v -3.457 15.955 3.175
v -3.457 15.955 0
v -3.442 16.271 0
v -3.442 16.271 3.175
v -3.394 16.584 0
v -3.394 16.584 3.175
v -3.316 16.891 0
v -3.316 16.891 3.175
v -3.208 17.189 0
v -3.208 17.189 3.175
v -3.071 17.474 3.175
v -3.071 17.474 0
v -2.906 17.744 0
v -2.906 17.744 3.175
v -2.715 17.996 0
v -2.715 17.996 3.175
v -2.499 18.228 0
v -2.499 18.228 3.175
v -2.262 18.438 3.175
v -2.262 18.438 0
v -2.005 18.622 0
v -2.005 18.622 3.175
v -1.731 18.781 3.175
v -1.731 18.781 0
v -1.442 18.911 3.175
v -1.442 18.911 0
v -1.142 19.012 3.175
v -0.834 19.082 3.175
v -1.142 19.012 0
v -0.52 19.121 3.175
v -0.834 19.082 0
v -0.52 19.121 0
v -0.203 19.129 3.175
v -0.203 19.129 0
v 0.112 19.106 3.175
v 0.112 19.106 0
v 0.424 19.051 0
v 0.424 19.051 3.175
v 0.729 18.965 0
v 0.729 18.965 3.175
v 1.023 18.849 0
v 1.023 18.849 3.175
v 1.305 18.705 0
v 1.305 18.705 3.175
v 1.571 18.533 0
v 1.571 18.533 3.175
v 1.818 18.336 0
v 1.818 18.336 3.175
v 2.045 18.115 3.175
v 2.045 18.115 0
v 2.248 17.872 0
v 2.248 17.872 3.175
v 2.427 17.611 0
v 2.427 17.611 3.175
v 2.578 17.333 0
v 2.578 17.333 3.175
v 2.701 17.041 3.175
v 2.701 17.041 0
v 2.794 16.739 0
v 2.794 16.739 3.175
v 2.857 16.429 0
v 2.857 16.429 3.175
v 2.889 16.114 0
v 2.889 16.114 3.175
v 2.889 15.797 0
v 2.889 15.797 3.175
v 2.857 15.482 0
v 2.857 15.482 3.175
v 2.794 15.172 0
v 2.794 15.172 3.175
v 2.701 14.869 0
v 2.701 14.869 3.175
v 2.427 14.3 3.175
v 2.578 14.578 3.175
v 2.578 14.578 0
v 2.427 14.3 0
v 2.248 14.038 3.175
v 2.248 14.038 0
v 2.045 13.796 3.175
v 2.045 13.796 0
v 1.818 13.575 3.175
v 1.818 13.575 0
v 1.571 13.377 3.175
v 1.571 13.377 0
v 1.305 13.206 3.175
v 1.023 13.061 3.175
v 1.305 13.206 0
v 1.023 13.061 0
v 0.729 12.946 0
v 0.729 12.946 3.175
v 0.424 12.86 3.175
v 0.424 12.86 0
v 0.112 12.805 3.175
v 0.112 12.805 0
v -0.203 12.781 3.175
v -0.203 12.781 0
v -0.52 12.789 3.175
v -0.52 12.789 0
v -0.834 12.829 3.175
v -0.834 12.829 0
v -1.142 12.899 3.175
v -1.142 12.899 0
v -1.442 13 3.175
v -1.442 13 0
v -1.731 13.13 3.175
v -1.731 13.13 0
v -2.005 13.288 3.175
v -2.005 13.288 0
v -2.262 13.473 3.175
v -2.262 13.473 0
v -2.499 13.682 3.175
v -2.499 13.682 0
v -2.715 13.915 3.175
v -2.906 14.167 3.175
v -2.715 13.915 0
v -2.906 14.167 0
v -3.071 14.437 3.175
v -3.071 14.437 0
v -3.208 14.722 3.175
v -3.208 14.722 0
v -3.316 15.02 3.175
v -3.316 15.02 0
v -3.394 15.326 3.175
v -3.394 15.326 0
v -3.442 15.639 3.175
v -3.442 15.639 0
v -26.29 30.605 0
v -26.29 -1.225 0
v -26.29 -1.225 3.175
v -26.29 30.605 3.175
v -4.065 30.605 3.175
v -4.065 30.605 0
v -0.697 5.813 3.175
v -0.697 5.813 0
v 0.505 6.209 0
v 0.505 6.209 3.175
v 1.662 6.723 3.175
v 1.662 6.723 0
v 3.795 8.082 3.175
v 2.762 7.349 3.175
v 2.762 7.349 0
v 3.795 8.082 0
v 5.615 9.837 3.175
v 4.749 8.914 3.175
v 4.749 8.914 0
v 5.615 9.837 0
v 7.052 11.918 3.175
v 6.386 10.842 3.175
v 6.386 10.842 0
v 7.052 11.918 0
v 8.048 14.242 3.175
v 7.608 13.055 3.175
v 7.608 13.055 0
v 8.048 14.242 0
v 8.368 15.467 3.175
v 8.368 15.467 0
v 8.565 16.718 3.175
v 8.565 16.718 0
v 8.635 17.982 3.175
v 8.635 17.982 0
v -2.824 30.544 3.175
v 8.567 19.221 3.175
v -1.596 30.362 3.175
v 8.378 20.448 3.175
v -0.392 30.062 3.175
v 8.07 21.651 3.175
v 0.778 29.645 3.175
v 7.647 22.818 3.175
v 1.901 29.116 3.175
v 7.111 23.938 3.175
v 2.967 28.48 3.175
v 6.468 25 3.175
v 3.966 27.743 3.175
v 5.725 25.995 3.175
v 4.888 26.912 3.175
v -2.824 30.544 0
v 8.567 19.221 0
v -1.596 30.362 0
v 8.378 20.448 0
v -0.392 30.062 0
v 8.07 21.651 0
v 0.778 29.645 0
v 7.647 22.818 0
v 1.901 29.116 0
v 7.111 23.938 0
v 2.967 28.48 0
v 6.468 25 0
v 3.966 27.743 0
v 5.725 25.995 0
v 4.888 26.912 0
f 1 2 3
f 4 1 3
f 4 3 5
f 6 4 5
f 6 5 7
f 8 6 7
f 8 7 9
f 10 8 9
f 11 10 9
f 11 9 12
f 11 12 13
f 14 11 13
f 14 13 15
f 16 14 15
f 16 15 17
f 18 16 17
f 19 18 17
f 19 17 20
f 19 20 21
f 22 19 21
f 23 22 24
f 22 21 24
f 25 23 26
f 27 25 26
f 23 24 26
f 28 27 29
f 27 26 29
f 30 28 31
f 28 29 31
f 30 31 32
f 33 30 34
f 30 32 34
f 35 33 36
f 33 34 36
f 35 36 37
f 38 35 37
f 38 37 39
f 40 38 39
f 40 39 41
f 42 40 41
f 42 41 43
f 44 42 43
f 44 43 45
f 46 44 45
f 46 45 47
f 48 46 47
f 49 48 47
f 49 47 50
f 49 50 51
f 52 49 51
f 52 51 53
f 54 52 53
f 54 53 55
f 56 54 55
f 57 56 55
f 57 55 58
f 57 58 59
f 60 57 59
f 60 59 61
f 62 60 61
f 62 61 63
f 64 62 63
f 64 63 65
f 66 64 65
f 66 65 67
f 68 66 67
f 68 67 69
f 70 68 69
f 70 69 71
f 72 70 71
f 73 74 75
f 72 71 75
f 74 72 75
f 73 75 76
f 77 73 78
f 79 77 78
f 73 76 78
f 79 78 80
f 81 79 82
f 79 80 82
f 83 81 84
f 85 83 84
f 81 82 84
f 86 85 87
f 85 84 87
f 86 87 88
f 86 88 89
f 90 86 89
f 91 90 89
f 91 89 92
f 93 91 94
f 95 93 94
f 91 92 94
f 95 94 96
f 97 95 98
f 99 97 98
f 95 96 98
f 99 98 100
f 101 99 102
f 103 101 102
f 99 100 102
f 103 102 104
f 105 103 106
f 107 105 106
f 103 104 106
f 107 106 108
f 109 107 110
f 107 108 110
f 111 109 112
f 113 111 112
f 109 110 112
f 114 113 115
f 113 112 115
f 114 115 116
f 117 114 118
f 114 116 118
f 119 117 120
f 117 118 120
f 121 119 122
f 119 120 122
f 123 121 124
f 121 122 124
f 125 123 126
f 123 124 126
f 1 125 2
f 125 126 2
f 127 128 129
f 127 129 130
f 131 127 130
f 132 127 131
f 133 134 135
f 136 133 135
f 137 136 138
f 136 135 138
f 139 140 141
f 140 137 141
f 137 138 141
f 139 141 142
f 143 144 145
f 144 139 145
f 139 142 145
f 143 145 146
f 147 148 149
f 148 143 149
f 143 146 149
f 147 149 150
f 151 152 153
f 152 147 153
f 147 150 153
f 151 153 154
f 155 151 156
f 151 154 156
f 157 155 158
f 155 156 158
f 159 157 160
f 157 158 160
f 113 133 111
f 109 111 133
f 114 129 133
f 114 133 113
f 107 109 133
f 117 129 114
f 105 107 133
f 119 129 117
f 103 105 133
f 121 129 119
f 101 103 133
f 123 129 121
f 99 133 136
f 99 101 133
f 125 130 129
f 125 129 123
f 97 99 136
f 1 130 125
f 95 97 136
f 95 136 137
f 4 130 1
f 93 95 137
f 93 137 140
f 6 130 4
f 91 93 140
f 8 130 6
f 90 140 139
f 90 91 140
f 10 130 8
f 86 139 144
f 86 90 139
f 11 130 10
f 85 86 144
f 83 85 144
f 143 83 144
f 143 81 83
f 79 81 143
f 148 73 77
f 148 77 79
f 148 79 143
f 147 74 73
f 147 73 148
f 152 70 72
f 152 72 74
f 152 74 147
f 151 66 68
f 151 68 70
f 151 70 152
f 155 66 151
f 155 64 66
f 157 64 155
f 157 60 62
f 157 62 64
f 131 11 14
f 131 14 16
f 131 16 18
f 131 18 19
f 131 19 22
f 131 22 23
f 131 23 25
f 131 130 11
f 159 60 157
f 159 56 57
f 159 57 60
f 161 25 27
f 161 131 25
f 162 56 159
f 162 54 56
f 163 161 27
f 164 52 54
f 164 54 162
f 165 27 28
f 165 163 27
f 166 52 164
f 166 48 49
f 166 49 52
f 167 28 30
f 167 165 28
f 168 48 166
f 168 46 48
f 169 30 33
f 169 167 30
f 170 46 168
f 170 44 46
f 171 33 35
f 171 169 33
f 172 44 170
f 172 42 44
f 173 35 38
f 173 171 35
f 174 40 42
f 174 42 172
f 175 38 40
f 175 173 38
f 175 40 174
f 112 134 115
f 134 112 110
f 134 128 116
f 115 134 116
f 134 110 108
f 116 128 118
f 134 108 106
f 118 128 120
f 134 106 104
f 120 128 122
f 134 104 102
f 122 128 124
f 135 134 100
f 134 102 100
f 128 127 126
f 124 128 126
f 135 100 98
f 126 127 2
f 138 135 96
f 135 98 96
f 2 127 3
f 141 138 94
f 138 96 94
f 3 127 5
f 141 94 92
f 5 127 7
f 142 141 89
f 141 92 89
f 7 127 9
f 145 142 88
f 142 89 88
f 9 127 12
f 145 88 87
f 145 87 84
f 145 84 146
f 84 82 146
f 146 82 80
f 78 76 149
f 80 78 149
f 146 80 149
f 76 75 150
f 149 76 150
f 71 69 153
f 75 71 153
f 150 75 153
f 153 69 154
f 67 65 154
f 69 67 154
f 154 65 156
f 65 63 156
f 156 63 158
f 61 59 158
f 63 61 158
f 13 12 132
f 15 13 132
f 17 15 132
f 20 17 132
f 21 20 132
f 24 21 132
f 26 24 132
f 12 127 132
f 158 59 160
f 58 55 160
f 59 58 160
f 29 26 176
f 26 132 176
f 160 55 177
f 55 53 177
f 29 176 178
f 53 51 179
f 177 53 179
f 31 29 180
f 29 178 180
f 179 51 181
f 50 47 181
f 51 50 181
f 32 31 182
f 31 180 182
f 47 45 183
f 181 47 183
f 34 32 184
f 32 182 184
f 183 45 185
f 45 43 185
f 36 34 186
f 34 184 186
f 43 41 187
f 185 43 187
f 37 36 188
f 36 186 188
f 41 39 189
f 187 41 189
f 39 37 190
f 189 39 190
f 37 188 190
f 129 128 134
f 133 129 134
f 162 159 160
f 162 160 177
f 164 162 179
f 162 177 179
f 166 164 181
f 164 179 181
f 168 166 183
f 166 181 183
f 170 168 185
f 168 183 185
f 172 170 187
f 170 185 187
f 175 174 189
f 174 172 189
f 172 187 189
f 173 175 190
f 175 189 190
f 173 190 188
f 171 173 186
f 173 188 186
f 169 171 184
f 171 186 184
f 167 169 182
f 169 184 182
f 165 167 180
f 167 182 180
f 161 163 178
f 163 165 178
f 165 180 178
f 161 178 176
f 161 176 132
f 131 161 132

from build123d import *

# Parameters (mm, degrees)
SKETCH1_W                       = 60.458144771
SKETCH1_H                       = 61.20911147
BOSS_EXTRUDE1_DEPTH             = 3.175
F_1_4_0_25_DIAMETER_HOLE1_D     = 6.35
F_1_4_0_25_DIAMETER_HOLE1_DEPTH = 9.268267535
F_1_4_0_25_DIAMETER_HOLE1_TIP   = 1.907732465
CUT_EXTRUDE1_DEPTH              = 46.980601635
FILLET1_R                       = 12.7


with BuildPart() as part:
    # Sketch1 → Boss-Extrude1 (new body)
    with BuildSketch(Plane.XY):
        with Locations((3.939572159, 0)):
            Rectangle(SKETCH1_W, SKETCH1_H)
    extrude(amount=BOSS_EXTRUDE1_DEPTH)

    # 1/4 (0.25) Diameter Hole1
    with Locations(Plane.XY.offset(3.175)):
        with Locations((-0.282440227, 15.955359735)):
            Hole(F_1_4_0_25_DIAMETER_HOLE1_D / 2, depth=F_1_4_0_25_DIAMETER_HOLE1_DEPTH)
            with Locations((0, 0, -(F_1_4_0_25_DIAMETER_HOLE1_DEPTH + F_1_4_0_25_DIAMETER_HOLE1_TIP / 2))):  # 118° drill point
                Cone(0, F_1_4_0_25_DIAMETER_HOLE1_D / 2, F_1_4_0_25_DIAMETER_HOLE1_TIP, mode=Mode.SUBTRACT)

    # Sketch4 → Cut-Extrude1 (cut, through all)
    with BuildSketch(Plane(origin=(0, 0, 0), x_dir=(-1, 0, 0), z_dir=(0, 0, -1))):
        Polygon((26.289500227, -1.224692265), (-8.635499773, 8.379555735), (-8.635499773, 30.604555735), (-34.168644544, 30.604555735), (-34.168644544, -30.604555735), (26.289500227, -30.604555735), align=None)
    extrude(amount=-CUT_EXTRUDE1_DEPTH, mode=Mode.SUBTRACT)

    # Fillet1
    # the kernel refuses this fillet: 12.7 mm, written as the material it takes off along each edge
    with BuildSketch(Plane(origin=(8.635499773, 30.604555735, -31.75), x_dir=(-1, 0, 0), z_dir=(0, 0, 1))) as fillet1_piece_1:
        with BuildLine():
            CenterArc((FILLET1_R, FILLET1_R), FILLET1_R, 180, 90)
            Line((0, FILLET1_R), (0, 0))
            Line((0, 0), (FILLET1_R, 0))
        make_face()
    extrude(amount=66.675, mode=Mode.SUBTRACT)
    with BuildSketch(Plane(origin=(8.635499773, 8.379555735, -24.197503605), x_dir=(0, 1, 0), z_dir=(0, 0, 1))) as fillet1_piece_2:
        with BuildLine():
            CenterArc((FILLET1_R * 0.762126097799, FILLET1_R), FILLET1_R, 195.376057549, 74.623942451)
            Line((-FILLET1_R * 0.202080191414, FILLET1_R * 0.734846776671), (0, 0))
            Line((0, 0), (FILLET1_R * 0.762126097799, 0))
        make_face()
    extrude(amount=51.57000721, mode=Mode.SUBTRACT)


solid = part.part
